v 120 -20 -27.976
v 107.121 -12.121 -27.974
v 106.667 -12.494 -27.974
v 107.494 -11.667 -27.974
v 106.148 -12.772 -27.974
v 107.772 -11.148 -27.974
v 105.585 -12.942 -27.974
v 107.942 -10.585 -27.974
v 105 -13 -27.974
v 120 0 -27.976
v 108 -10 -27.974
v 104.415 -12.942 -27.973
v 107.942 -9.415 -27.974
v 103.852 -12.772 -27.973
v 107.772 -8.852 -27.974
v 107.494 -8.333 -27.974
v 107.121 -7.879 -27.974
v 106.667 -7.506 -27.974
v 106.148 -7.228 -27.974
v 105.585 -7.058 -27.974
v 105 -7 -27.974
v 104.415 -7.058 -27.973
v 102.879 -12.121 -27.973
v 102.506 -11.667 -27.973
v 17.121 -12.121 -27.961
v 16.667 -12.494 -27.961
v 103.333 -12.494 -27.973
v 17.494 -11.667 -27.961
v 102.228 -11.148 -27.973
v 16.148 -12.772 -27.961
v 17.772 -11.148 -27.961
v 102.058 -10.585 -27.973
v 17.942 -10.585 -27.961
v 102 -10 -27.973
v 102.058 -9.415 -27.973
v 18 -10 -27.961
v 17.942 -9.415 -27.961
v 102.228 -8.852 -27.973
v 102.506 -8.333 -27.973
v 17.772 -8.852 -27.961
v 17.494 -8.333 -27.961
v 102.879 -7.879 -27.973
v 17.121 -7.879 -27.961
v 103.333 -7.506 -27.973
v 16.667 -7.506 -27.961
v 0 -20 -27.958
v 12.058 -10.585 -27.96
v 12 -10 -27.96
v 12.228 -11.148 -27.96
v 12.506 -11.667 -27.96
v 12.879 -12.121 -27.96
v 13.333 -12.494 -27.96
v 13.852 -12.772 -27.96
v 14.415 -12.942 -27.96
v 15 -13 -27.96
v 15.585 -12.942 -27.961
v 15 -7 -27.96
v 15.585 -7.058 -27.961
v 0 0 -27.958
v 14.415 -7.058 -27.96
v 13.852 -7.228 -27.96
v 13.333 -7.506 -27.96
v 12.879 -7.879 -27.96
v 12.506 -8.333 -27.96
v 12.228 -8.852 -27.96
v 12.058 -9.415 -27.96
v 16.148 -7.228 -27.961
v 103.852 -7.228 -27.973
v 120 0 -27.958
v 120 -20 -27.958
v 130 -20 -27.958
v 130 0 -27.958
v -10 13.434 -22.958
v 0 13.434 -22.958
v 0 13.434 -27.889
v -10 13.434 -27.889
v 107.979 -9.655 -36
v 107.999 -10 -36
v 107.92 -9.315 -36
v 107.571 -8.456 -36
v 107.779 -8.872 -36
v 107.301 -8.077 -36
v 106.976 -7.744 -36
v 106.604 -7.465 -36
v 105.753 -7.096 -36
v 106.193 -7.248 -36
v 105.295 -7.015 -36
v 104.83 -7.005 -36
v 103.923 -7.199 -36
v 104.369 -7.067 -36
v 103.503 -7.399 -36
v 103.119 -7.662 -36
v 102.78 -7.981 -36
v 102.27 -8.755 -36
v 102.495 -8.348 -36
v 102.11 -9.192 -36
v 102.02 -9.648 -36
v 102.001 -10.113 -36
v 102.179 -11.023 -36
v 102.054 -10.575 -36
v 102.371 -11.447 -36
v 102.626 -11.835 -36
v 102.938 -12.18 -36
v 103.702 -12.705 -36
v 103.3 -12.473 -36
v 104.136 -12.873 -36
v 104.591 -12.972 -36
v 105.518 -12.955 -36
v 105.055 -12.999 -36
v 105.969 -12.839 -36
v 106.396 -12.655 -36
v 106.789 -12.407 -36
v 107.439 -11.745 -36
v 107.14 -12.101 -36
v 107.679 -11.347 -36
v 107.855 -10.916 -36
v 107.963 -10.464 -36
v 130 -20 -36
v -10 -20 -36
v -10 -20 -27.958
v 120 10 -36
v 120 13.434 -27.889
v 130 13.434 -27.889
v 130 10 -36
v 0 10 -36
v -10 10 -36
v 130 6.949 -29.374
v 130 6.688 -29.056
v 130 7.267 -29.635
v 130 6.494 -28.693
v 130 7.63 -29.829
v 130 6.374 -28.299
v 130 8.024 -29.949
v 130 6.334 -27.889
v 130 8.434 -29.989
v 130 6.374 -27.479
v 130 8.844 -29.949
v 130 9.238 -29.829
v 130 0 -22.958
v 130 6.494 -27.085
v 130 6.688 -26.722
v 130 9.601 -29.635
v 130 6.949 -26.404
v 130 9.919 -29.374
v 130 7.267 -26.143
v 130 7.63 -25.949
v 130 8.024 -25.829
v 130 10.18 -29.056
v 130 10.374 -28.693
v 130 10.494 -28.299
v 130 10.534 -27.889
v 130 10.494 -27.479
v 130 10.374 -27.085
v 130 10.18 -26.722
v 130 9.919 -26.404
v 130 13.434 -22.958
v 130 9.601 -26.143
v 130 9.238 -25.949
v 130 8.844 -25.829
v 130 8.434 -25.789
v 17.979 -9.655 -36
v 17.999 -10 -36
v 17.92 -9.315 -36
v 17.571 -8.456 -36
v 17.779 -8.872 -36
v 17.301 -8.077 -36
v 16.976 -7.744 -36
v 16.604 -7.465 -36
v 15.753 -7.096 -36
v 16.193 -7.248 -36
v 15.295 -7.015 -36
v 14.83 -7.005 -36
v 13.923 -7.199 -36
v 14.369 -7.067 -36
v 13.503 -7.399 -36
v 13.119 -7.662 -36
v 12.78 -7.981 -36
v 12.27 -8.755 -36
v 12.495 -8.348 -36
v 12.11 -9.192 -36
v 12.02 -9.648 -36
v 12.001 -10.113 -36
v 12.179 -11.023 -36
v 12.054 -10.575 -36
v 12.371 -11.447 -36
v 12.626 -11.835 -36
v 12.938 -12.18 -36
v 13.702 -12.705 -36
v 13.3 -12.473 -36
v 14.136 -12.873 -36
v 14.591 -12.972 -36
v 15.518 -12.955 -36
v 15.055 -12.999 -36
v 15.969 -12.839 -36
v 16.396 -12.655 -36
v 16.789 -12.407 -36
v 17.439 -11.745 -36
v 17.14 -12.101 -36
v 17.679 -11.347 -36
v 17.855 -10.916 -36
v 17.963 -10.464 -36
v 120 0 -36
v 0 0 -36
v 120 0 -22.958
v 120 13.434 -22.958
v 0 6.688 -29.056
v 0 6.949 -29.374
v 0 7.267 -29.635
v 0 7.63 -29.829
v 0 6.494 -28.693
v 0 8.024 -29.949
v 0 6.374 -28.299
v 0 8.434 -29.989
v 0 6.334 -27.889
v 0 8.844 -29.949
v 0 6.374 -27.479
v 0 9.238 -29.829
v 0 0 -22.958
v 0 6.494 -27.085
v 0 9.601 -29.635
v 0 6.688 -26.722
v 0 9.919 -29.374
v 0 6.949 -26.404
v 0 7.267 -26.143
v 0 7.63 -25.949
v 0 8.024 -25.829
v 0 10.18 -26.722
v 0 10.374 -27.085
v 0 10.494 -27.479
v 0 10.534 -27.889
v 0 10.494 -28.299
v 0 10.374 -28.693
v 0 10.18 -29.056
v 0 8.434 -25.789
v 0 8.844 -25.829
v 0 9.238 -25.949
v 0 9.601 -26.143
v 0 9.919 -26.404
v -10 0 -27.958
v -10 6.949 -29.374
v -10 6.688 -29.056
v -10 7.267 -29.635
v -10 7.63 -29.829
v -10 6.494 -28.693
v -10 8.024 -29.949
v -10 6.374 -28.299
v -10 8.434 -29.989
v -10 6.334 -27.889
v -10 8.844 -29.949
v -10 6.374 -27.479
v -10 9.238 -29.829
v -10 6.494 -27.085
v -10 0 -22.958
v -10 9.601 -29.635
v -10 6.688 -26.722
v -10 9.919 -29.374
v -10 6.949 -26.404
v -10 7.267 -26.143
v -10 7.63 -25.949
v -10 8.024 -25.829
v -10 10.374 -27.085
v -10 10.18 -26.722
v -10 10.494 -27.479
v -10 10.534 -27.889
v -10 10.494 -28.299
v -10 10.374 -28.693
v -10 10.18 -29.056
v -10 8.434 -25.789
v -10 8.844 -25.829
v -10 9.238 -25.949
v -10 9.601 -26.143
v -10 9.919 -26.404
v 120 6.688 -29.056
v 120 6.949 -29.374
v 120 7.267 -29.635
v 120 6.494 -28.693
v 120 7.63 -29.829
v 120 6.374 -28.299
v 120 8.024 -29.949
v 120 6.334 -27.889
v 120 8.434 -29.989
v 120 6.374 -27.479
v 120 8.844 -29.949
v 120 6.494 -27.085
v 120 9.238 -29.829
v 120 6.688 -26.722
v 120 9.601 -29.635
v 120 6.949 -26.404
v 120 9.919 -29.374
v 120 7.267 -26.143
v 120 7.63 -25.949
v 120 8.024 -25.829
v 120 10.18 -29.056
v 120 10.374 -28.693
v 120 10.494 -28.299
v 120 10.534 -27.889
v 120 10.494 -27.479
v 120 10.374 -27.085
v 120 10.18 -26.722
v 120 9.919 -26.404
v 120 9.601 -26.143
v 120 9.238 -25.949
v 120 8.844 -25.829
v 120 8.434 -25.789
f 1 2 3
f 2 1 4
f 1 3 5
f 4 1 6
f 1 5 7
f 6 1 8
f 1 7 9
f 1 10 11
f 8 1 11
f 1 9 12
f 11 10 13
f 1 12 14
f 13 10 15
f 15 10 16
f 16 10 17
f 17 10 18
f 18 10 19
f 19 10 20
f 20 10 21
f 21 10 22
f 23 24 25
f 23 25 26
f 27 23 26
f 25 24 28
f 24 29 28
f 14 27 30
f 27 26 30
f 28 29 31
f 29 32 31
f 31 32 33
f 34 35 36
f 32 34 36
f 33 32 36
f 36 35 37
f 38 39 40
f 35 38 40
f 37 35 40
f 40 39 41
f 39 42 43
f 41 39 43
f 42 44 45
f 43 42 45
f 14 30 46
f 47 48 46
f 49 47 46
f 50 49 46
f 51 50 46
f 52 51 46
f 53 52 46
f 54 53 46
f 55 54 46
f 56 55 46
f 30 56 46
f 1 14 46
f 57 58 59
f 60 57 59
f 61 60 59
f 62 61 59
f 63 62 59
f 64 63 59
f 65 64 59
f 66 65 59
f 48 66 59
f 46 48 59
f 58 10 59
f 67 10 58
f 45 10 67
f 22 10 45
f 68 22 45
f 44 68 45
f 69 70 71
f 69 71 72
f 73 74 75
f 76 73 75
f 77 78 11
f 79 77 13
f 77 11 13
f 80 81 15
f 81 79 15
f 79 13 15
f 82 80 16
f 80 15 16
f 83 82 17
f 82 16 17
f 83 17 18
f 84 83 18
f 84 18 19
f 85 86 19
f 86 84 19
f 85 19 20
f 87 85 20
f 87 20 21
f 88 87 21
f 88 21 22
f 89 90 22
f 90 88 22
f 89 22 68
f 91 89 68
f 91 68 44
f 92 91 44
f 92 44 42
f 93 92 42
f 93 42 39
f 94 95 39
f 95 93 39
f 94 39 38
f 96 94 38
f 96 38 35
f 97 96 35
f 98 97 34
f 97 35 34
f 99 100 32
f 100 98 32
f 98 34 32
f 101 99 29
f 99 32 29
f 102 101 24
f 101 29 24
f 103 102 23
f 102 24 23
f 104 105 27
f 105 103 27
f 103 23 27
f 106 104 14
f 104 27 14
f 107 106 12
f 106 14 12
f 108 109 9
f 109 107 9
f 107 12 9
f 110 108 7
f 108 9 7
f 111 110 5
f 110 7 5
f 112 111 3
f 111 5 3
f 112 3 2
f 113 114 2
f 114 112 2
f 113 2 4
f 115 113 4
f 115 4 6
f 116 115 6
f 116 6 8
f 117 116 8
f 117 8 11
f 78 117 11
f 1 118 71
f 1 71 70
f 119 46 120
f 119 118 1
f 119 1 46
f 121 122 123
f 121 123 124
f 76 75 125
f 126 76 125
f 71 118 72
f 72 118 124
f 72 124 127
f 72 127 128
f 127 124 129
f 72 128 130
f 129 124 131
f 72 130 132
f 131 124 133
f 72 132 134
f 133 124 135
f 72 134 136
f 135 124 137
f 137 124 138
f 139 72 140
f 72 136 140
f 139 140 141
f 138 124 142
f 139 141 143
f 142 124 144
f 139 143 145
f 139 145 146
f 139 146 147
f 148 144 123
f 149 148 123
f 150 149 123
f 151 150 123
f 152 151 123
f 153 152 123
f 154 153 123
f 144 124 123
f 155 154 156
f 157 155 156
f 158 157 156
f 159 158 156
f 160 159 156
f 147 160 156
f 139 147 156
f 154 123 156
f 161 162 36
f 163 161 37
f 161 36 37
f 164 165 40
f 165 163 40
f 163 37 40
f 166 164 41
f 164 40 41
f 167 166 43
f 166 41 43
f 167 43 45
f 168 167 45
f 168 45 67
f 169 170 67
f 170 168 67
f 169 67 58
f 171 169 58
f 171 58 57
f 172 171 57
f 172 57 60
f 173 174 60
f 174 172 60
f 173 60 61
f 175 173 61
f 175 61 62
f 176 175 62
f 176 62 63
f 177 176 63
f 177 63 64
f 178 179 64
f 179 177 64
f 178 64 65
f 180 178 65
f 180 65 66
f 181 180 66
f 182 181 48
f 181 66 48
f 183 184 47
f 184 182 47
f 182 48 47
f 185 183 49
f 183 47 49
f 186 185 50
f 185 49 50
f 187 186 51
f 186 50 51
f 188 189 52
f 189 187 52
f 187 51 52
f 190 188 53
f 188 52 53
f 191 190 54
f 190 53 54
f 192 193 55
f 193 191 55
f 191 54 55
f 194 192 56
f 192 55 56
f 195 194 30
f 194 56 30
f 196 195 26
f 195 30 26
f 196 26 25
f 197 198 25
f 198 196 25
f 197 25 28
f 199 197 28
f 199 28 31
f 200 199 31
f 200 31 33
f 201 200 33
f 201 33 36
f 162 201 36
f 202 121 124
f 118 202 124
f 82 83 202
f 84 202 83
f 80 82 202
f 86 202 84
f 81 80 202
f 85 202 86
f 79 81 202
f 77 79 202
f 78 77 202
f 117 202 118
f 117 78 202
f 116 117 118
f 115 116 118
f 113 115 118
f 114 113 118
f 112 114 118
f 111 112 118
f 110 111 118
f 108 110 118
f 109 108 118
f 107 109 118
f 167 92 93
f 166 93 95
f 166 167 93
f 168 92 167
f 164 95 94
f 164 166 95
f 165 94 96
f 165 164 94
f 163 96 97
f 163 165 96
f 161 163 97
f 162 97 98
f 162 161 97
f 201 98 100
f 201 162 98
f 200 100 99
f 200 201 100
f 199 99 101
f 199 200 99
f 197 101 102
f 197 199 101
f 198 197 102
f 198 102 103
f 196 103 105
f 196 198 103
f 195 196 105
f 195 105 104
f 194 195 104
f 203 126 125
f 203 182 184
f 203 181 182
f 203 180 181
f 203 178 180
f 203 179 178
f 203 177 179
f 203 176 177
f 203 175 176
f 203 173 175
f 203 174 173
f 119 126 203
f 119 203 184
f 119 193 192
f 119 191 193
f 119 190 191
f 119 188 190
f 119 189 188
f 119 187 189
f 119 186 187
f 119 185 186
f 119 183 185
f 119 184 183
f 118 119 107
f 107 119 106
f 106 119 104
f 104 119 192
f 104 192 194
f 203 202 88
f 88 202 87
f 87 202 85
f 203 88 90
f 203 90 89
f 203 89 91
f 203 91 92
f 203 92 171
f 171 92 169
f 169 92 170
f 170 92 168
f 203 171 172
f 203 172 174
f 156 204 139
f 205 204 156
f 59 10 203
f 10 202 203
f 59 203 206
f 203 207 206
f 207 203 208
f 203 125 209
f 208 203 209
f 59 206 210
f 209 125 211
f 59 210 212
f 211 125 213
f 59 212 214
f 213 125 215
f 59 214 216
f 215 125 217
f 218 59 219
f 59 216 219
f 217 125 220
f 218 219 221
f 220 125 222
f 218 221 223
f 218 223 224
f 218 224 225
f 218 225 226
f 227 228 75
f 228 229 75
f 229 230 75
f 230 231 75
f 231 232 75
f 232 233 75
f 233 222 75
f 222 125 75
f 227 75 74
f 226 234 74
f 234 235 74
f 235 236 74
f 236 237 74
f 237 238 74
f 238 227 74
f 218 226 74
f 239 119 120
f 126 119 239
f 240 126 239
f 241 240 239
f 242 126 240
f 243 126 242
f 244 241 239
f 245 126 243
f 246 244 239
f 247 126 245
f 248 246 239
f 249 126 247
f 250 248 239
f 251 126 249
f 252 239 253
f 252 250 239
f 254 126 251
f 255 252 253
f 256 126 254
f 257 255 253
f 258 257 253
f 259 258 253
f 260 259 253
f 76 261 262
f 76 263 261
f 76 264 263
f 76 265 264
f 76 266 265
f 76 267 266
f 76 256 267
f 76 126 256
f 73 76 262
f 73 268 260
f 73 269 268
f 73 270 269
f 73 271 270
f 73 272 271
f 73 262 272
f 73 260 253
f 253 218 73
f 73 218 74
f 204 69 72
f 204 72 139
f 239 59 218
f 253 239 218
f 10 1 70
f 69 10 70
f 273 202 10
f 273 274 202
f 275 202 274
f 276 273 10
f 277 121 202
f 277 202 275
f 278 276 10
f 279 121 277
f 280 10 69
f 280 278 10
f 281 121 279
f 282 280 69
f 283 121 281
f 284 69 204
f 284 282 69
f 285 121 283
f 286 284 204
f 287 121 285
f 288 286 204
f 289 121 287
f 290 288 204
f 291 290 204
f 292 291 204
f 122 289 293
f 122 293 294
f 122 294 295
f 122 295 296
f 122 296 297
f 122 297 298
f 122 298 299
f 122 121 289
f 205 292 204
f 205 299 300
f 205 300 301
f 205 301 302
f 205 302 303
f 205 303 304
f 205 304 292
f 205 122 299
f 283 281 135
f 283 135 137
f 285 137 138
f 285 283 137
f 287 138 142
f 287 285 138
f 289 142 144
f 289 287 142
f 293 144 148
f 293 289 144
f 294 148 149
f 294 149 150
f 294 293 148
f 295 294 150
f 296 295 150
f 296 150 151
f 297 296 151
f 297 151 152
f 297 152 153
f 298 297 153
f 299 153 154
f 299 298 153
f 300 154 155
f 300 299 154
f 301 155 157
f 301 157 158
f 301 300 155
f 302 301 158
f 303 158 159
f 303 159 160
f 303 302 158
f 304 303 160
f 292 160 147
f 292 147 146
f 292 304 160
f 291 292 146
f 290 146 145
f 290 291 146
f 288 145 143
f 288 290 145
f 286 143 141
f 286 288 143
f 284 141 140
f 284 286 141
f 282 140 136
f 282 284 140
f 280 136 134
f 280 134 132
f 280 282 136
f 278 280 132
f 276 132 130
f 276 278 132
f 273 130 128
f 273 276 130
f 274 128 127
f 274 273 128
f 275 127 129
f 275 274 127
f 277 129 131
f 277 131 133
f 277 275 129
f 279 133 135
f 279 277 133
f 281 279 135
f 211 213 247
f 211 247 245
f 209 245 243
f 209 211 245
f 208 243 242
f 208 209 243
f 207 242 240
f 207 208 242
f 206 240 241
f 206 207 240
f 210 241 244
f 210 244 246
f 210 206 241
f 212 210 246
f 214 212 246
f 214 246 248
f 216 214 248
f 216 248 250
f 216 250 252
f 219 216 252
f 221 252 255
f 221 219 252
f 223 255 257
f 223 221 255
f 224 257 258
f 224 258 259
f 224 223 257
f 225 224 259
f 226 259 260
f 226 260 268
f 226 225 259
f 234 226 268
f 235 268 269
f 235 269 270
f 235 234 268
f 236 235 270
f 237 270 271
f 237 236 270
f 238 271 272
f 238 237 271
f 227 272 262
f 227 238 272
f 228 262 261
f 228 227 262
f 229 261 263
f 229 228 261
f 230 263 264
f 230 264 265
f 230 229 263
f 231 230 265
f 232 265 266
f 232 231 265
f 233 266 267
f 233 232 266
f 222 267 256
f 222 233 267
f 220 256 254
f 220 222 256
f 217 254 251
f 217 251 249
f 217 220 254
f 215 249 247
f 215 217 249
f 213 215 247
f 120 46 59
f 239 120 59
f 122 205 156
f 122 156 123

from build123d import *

# Parameters (mm, degrees)
SKETCH_1_R          = 2.1
EXTRUDE_1_DEPTH     = 10
SKETCH_2_R          = 2.1
EXTRUDE_2_DEPTH     = 10
EXTRUDE_3_DEPTH     = 20
SKETCH_4_R          = 3
CUT_EXTRUDE_1_DEPTH = 20


with BuildPart() as part:
    # Эскиз1 → Бобышка-Вытянуть1 (new body)
    with BuildSketch(Plane(origin=(120, 0, 0), x_dir=(0, 0, -1), z_dir=(1, 0, 0))):
        Polygon((27.888881523, 13.434002899), (36, 10), (36, -20), (27.958257708, -20), (27.958257708, 0), (22.958257708, 0), (22.958257708, 13.434002899), align=None)
        with Locations((27.888881523, 8.434002899)):
            Circle(SKETCH_1_R, mode=Mode.SUBTRACT)
    extrude(amount=EXTRUDE_1_DEPTH)



with BuildPart() as body_2:
    # Эскиз2 → Бобышка-Вытянуть2 (new body)
    with BuildSketch(Plane.ZY):
        Polygon((-22.958257708, 13.434002899), (-27.888881523, 13.434002899), (-36, 10), (-36, -20), (-27.958257708, -20), (-27.958257708, 0), (-22.958257708, 0), align=None)
        with Locations(Location((-27.888881523, 8.434002899, 0), (0, 0, 180))):
            Circle(SKETCH_2_R, mode=Mode.SUBTRACT)
    extrude(amount=EXTRUDE_2_DEPTH)


with BuildPart() as part_1:
    add(part.part)

    add(body_2.part)  # Бобышка-Вытянуть3 merges body 2
    # Эскиз3 → Бобышка-Вытянуть3 (add)
    with BuildSketch(Plane(origin=(0, 0, 0), x_dir=(-1, 0, 0), z_dir=(0, -1, 0))):
        Polygon((-120, 27.975706714), (0, 27.958257708), (0, 36), (-120, 36), align=None)
    extrude(amount=EXTRUDE_3_DEPTH)

    # Эскиз4 → Вырез-Вытянуть1 (cut)
    with BuildSketch(Plane(origin=(-0.004065365, 0, -27.958257117), x_dir=(0.9999999894282007, 0, -0.00014540838614521652), z_dir=(0.00014540838614521652, 0, 0.9999999894282007))):
        with Locations((15.004065365, -10)):
            Circle(SKETCH_4_R)
        with Locations((105.004064097, -10)):
            Circle(SKETCH_4_R)
    extrude(amount=-CUT_EXTRUDE_1_DEPTH, mode=Mode.SUBTRACT)


solid = part_1.part
